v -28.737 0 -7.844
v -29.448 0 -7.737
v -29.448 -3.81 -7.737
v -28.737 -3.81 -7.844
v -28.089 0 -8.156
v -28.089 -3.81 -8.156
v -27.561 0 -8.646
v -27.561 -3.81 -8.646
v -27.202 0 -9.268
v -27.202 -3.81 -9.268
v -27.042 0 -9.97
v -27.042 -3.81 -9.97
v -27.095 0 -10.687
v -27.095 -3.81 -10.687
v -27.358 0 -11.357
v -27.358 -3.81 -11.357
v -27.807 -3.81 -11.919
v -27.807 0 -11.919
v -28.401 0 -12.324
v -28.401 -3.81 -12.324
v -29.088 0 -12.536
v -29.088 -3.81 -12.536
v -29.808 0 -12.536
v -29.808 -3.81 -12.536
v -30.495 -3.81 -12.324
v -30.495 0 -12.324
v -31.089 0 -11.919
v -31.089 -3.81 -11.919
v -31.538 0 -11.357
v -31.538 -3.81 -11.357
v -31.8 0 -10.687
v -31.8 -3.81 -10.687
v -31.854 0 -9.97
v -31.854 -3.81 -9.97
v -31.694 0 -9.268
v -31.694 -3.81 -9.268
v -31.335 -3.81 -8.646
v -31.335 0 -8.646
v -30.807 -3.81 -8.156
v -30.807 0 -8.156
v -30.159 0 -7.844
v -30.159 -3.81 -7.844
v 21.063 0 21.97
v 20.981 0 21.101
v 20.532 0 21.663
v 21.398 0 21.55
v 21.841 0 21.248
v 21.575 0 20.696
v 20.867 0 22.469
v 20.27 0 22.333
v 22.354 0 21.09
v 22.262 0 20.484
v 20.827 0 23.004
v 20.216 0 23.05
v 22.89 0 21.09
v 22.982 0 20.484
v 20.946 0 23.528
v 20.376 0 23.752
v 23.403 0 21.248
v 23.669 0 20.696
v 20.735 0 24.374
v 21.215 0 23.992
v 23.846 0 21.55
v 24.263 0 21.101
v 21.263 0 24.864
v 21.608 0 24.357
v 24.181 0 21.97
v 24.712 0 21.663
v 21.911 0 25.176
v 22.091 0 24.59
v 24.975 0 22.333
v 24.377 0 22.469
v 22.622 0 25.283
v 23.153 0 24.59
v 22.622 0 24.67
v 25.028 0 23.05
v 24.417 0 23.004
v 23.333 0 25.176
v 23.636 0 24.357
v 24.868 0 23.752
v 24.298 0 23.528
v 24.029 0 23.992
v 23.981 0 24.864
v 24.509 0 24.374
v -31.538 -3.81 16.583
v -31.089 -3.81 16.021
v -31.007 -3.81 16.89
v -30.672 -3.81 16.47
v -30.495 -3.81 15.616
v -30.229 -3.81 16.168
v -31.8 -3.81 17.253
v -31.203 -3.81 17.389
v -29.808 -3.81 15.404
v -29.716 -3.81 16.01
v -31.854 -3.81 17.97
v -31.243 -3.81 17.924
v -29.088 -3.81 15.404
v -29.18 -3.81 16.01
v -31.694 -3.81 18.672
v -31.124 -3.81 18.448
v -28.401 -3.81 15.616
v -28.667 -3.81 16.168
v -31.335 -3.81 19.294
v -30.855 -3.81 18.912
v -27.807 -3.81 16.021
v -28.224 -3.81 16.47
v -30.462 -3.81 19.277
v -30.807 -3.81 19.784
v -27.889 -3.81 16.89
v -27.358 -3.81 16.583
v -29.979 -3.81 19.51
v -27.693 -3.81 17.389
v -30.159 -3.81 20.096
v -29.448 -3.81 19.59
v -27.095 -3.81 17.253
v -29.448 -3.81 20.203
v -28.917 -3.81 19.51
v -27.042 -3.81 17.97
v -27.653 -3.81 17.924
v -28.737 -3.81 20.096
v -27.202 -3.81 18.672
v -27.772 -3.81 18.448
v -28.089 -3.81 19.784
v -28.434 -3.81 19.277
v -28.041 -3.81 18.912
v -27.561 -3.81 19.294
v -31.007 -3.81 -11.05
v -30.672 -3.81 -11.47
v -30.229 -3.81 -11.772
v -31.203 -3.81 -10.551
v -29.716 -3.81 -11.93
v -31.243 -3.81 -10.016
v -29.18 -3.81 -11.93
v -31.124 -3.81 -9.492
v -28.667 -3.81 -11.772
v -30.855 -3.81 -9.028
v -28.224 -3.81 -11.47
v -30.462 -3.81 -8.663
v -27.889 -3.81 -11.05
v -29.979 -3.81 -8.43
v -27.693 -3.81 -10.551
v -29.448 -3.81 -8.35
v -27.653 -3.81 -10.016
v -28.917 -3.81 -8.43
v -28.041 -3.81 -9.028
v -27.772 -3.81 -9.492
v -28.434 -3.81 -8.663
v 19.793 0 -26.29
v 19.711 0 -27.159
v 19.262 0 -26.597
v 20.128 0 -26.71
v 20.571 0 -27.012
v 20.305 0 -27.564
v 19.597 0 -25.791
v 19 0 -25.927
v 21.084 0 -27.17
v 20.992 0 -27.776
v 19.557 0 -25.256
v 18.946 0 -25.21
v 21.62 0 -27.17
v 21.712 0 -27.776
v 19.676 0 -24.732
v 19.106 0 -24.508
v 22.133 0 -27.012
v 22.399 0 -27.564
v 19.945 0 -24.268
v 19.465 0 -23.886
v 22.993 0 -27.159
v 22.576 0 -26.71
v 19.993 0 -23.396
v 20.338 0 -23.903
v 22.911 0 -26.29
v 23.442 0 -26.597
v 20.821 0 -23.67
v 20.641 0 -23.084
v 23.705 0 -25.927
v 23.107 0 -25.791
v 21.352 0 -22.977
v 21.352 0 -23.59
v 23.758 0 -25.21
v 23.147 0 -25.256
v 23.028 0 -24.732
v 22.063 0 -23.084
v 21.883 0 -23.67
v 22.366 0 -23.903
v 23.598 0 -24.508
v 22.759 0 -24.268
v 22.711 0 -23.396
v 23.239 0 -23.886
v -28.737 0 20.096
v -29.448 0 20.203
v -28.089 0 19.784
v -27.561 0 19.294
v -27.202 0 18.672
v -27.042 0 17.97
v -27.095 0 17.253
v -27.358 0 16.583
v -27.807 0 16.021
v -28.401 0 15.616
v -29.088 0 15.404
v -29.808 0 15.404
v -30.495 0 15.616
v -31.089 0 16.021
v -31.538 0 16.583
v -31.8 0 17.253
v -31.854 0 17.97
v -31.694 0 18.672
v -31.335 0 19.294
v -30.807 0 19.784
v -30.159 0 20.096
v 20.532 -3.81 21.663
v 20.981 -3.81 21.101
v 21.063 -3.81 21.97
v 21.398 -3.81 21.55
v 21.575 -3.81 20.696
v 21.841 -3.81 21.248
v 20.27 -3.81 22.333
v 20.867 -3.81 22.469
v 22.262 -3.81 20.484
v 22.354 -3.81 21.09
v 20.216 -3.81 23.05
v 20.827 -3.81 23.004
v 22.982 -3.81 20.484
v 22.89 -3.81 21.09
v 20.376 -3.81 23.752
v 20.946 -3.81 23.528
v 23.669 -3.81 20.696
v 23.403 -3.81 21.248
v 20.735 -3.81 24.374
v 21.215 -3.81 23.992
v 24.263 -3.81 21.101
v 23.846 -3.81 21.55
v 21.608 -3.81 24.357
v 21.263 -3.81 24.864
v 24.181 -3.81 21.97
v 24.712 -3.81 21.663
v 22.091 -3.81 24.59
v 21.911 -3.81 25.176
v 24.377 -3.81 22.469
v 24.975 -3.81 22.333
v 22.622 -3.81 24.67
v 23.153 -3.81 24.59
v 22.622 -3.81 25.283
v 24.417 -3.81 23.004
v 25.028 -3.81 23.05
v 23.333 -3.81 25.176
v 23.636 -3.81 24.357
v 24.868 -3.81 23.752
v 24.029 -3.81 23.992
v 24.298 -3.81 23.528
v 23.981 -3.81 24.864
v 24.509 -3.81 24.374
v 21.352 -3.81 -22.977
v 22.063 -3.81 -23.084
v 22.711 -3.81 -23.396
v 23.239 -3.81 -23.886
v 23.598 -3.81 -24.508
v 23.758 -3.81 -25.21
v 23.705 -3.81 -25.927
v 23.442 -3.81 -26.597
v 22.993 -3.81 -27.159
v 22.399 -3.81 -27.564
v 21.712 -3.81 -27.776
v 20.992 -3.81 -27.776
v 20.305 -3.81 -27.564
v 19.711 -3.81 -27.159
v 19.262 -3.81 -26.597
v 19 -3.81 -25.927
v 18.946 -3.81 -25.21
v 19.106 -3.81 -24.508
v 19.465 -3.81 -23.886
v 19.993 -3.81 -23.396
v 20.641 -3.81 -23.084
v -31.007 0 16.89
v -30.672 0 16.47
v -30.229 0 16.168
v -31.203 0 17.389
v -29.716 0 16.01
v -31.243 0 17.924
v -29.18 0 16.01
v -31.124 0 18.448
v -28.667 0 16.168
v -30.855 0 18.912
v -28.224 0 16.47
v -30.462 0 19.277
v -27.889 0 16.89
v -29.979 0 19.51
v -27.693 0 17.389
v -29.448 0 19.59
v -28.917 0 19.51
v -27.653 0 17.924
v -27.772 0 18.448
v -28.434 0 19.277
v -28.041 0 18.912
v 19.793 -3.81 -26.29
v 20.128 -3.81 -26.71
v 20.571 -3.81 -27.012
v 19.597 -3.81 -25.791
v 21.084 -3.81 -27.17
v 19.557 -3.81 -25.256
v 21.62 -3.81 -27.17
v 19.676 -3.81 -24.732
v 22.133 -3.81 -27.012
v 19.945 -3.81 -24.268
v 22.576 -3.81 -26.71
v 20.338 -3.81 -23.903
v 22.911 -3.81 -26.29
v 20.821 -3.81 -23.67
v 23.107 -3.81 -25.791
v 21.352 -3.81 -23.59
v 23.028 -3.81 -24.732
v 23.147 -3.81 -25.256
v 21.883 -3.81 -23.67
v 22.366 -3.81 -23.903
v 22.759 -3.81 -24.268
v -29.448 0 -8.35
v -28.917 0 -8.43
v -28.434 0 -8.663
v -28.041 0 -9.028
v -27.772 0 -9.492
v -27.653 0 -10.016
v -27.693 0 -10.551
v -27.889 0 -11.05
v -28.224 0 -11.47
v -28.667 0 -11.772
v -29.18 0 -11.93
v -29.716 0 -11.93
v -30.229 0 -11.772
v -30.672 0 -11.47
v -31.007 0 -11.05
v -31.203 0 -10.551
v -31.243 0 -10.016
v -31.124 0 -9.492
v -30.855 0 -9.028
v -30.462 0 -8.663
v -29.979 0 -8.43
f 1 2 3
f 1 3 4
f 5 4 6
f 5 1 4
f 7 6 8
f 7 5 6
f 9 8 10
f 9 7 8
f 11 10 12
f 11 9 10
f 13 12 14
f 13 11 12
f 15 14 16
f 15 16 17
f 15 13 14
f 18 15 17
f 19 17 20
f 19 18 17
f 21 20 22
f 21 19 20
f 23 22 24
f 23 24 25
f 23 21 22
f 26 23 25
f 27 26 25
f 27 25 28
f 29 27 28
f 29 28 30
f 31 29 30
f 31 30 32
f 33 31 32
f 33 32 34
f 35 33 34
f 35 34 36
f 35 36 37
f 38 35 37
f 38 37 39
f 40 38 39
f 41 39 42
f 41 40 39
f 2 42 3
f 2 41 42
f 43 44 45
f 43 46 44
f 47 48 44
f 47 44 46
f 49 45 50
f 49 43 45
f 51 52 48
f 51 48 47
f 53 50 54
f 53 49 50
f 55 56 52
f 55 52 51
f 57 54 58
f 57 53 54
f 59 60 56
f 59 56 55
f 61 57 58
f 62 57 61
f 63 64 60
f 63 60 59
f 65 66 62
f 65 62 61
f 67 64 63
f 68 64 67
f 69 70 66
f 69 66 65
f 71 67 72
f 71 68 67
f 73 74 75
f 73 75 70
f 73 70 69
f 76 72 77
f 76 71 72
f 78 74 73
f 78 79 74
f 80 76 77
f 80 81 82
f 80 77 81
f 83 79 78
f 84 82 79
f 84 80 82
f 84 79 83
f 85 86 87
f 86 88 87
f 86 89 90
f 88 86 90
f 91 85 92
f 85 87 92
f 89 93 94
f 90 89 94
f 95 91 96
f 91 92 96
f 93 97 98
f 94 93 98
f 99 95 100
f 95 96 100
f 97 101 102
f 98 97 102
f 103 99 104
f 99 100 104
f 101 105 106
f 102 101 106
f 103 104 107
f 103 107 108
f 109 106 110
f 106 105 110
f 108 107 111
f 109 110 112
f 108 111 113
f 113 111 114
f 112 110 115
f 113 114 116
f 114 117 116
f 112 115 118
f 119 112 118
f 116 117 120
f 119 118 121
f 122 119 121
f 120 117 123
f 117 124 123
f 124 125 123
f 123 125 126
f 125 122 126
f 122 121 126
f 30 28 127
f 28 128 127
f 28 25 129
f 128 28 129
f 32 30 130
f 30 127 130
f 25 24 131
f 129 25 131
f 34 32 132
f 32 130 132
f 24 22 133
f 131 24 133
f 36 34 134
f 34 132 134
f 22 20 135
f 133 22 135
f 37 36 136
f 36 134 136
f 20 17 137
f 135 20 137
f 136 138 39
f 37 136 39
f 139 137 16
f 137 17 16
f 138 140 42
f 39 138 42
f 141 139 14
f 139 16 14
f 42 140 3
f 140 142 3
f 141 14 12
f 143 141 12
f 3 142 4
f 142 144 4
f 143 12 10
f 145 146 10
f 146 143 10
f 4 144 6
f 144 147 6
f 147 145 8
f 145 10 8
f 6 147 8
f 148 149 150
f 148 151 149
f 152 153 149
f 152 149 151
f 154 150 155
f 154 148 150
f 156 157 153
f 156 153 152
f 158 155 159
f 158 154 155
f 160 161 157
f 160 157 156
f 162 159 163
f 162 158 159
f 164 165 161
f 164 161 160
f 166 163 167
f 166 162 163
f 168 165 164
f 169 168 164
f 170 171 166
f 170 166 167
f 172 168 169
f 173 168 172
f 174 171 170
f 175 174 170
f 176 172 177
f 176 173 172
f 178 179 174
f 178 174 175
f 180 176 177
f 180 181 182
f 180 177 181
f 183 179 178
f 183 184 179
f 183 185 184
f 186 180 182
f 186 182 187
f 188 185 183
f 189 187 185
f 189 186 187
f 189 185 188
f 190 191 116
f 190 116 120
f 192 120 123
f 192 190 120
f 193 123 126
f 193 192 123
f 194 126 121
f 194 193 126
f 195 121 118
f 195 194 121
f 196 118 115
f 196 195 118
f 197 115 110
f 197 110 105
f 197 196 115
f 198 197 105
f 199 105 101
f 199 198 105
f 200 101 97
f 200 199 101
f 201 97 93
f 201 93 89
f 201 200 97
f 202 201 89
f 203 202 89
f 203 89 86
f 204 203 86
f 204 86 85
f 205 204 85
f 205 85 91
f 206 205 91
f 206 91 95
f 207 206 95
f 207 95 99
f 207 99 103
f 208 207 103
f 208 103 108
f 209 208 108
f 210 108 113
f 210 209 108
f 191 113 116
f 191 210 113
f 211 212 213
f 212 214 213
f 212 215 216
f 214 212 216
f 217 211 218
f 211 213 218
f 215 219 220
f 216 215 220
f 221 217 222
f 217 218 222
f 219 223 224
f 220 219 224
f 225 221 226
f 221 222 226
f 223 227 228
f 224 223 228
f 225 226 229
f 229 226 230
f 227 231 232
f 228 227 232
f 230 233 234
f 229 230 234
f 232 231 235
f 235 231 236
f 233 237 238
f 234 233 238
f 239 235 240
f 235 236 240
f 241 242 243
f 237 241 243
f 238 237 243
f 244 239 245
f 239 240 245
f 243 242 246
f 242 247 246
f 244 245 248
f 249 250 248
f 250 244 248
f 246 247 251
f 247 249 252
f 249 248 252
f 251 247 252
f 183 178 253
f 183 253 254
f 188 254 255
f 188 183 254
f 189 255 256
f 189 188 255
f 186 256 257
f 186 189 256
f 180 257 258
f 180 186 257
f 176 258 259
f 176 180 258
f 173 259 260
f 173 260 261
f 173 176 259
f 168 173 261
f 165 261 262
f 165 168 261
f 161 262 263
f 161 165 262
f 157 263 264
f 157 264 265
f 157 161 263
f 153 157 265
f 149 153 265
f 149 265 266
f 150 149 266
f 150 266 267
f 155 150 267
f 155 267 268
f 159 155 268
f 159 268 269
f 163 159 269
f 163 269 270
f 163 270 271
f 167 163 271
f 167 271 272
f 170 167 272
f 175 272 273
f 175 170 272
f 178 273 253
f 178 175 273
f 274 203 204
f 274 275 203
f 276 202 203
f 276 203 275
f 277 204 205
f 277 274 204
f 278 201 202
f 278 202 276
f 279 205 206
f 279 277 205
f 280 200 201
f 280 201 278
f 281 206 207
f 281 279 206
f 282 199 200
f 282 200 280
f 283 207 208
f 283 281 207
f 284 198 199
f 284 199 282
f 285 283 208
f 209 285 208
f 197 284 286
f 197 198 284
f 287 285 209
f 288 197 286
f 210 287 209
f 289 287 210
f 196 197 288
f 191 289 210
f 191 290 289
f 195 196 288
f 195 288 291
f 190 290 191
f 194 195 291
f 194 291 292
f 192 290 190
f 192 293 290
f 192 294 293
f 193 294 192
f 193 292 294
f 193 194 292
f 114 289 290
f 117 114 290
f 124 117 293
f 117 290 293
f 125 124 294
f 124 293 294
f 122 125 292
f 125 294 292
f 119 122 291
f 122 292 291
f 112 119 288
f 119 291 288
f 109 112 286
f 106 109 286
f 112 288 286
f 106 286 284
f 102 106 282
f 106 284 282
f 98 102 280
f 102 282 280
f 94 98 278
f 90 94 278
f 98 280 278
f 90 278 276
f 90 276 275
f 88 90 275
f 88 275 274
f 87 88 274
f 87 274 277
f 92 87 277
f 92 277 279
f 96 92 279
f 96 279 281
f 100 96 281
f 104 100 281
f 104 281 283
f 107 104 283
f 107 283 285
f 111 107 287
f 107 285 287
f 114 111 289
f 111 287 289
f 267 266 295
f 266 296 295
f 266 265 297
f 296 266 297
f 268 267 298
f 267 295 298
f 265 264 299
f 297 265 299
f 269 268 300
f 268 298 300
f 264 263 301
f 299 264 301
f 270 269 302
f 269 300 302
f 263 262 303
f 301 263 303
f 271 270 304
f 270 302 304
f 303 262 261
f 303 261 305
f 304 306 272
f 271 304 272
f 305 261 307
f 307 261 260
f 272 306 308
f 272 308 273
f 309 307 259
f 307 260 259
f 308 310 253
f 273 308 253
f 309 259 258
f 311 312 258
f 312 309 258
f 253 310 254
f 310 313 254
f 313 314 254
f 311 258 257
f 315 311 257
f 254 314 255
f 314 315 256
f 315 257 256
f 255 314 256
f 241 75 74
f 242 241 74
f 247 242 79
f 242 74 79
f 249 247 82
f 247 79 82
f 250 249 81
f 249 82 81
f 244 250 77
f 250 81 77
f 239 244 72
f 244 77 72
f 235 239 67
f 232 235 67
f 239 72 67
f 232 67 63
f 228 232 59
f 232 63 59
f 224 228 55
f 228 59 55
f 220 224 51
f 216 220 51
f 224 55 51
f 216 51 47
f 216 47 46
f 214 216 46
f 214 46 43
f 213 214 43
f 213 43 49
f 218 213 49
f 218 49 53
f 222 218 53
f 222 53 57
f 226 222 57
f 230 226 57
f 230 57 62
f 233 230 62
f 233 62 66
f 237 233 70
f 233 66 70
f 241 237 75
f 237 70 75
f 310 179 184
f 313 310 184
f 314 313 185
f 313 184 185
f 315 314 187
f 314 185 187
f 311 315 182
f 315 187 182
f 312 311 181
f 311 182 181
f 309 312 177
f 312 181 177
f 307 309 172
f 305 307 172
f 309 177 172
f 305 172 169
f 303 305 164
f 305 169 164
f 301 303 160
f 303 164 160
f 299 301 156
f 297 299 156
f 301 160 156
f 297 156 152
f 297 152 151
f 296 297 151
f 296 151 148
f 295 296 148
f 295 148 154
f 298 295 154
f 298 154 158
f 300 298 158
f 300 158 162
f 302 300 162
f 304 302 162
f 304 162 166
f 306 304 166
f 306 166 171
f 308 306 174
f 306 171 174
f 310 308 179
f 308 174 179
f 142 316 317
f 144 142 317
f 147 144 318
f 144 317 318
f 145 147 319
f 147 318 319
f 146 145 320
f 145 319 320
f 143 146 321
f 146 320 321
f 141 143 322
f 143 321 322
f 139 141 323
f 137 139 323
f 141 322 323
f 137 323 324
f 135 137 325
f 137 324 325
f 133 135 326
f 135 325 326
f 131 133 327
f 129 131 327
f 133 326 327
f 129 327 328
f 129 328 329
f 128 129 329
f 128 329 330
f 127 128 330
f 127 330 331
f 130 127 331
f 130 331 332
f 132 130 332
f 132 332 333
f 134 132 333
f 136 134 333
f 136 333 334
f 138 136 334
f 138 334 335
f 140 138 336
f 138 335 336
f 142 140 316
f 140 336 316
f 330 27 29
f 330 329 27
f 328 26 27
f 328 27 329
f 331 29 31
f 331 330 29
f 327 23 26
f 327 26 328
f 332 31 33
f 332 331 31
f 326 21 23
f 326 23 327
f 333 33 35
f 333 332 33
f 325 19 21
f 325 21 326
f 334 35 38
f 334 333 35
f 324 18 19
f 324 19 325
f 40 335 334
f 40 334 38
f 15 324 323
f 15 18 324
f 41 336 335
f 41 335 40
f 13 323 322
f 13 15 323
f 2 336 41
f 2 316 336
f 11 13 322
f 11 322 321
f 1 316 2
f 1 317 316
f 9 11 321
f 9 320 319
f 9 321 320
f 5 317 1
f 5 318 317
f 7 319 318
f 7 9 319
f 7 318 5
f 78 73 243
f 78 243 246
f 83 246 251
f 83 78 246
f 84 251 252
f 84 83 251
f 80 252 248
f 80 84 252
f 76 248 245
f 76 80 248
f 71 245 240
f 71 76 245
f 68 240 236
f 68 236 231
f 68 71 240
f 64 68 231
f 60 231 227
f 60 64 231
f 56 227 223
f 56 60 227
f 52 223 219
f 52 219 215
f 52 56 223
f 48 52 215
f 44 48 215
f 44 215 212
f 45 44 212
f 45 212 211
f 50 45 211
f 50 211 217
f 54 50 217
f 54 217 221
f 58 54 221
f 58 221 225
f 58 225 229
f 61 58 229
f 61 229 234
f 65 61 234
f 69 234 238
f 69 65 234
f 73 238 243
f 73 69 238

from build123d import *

# Parameters (mm, degrees)
SKETCH1_R             = 2.413
SKETCH1_R_2           = 1.8
BOSS_EXTRUDE1_DEPTH   = 3.81
BOSS_EXTRUDE1_2_DEPTH = 3.81
BOSS_EXTRUDE1_3_DEPTH = 3.81
BOSS_EXTRUDE1_4_DEPTH = 3.81


with BuildPart() as part:
    # Sketch1 → Boss-Extrude1 (new body)
    with BuildSketch(Plane(origin=(0, 0, 0), x_dir=(1, 0, 0), z_dir=(0, 1, 0))):
        with Locations(Location((-29.447979475, -17.789937656, 0), (0, 0, 270))):
            Circle(SKETCH1_R)
        with Locations(Location((-29.447979475, -17.789937656, 0), (0, 0, 270))):
            Circle(SKETCH1_R_2, mode=Mode.SUBTRACT)
    extrude(amount=-BOSS_EXTRUDE1_DEPTH)


with BuildPart() as body_2:
    # Sketch1 → Boss-Extrude1 2 (new body)
    with BuildSketch(Plane(origin=(0, 0, 0), x_dir=(1, 0, 0), z_dir=(0, 1, 0))):
        with Locations(Location((-29.447979475, 10.150062344, 0), (0, 0, 270))):
            Circle(SKETCH1_R)
        with Locations(Location((-29.447979475, 10.150062344, 0), (0, 0, 270))):
            Circle(SKETCH1_R_2, mode=Mode.SUBTRACT)
    extrude(amount=-BOSS_EXTRUDE1_2_DEPTH)


with BuildPart() as body_3:
    # Sketch1 → Boss-Extrude1 3 (new body)
    with BuildSketch(Plane(origin=(0, 0, 0), x_dir=(1, 0, 0), z_dir=(0, 1, 0))):
        with Locations(Location((21.352020525, 25.390062344, 0), (0, 0, 270))):
            Circle(SKETCH1_R)
        with Locations(Location((21.352020525, 25.390062344, 0), (0, 0, 270))):
            Circle(SKETCH1_R_2, mode=Mode.SUBTRACT)
    extrude(amount=-BOSS_EXTRUDE1_3_DEPTH)


with BuildPart() as body_4:
    # Sketch1 → Boss-Extrude1 4 (new body)
    with BuildSketch(Plane(origin=(0, 0, 0), x_dir=(1, 0, 0), z_dir=(0, 1, 0))):
        with Locations(Location((22.622020525, -22.869937656, 0), (0, 0, 270))):
            Circle(SKETCH1_R)
        with Locations(Location((22.622020525, -22.869937656, 0), (0, 0, 270))):
            Circle(SKETCH1_R_2, mode=Mode.SUBTRACT)
    extrude(amount=-BOSS_EXTRUDE1_4_DEPTH)


solid = Compound([part.part, body_2.part, body_3.part, body_4.part])
